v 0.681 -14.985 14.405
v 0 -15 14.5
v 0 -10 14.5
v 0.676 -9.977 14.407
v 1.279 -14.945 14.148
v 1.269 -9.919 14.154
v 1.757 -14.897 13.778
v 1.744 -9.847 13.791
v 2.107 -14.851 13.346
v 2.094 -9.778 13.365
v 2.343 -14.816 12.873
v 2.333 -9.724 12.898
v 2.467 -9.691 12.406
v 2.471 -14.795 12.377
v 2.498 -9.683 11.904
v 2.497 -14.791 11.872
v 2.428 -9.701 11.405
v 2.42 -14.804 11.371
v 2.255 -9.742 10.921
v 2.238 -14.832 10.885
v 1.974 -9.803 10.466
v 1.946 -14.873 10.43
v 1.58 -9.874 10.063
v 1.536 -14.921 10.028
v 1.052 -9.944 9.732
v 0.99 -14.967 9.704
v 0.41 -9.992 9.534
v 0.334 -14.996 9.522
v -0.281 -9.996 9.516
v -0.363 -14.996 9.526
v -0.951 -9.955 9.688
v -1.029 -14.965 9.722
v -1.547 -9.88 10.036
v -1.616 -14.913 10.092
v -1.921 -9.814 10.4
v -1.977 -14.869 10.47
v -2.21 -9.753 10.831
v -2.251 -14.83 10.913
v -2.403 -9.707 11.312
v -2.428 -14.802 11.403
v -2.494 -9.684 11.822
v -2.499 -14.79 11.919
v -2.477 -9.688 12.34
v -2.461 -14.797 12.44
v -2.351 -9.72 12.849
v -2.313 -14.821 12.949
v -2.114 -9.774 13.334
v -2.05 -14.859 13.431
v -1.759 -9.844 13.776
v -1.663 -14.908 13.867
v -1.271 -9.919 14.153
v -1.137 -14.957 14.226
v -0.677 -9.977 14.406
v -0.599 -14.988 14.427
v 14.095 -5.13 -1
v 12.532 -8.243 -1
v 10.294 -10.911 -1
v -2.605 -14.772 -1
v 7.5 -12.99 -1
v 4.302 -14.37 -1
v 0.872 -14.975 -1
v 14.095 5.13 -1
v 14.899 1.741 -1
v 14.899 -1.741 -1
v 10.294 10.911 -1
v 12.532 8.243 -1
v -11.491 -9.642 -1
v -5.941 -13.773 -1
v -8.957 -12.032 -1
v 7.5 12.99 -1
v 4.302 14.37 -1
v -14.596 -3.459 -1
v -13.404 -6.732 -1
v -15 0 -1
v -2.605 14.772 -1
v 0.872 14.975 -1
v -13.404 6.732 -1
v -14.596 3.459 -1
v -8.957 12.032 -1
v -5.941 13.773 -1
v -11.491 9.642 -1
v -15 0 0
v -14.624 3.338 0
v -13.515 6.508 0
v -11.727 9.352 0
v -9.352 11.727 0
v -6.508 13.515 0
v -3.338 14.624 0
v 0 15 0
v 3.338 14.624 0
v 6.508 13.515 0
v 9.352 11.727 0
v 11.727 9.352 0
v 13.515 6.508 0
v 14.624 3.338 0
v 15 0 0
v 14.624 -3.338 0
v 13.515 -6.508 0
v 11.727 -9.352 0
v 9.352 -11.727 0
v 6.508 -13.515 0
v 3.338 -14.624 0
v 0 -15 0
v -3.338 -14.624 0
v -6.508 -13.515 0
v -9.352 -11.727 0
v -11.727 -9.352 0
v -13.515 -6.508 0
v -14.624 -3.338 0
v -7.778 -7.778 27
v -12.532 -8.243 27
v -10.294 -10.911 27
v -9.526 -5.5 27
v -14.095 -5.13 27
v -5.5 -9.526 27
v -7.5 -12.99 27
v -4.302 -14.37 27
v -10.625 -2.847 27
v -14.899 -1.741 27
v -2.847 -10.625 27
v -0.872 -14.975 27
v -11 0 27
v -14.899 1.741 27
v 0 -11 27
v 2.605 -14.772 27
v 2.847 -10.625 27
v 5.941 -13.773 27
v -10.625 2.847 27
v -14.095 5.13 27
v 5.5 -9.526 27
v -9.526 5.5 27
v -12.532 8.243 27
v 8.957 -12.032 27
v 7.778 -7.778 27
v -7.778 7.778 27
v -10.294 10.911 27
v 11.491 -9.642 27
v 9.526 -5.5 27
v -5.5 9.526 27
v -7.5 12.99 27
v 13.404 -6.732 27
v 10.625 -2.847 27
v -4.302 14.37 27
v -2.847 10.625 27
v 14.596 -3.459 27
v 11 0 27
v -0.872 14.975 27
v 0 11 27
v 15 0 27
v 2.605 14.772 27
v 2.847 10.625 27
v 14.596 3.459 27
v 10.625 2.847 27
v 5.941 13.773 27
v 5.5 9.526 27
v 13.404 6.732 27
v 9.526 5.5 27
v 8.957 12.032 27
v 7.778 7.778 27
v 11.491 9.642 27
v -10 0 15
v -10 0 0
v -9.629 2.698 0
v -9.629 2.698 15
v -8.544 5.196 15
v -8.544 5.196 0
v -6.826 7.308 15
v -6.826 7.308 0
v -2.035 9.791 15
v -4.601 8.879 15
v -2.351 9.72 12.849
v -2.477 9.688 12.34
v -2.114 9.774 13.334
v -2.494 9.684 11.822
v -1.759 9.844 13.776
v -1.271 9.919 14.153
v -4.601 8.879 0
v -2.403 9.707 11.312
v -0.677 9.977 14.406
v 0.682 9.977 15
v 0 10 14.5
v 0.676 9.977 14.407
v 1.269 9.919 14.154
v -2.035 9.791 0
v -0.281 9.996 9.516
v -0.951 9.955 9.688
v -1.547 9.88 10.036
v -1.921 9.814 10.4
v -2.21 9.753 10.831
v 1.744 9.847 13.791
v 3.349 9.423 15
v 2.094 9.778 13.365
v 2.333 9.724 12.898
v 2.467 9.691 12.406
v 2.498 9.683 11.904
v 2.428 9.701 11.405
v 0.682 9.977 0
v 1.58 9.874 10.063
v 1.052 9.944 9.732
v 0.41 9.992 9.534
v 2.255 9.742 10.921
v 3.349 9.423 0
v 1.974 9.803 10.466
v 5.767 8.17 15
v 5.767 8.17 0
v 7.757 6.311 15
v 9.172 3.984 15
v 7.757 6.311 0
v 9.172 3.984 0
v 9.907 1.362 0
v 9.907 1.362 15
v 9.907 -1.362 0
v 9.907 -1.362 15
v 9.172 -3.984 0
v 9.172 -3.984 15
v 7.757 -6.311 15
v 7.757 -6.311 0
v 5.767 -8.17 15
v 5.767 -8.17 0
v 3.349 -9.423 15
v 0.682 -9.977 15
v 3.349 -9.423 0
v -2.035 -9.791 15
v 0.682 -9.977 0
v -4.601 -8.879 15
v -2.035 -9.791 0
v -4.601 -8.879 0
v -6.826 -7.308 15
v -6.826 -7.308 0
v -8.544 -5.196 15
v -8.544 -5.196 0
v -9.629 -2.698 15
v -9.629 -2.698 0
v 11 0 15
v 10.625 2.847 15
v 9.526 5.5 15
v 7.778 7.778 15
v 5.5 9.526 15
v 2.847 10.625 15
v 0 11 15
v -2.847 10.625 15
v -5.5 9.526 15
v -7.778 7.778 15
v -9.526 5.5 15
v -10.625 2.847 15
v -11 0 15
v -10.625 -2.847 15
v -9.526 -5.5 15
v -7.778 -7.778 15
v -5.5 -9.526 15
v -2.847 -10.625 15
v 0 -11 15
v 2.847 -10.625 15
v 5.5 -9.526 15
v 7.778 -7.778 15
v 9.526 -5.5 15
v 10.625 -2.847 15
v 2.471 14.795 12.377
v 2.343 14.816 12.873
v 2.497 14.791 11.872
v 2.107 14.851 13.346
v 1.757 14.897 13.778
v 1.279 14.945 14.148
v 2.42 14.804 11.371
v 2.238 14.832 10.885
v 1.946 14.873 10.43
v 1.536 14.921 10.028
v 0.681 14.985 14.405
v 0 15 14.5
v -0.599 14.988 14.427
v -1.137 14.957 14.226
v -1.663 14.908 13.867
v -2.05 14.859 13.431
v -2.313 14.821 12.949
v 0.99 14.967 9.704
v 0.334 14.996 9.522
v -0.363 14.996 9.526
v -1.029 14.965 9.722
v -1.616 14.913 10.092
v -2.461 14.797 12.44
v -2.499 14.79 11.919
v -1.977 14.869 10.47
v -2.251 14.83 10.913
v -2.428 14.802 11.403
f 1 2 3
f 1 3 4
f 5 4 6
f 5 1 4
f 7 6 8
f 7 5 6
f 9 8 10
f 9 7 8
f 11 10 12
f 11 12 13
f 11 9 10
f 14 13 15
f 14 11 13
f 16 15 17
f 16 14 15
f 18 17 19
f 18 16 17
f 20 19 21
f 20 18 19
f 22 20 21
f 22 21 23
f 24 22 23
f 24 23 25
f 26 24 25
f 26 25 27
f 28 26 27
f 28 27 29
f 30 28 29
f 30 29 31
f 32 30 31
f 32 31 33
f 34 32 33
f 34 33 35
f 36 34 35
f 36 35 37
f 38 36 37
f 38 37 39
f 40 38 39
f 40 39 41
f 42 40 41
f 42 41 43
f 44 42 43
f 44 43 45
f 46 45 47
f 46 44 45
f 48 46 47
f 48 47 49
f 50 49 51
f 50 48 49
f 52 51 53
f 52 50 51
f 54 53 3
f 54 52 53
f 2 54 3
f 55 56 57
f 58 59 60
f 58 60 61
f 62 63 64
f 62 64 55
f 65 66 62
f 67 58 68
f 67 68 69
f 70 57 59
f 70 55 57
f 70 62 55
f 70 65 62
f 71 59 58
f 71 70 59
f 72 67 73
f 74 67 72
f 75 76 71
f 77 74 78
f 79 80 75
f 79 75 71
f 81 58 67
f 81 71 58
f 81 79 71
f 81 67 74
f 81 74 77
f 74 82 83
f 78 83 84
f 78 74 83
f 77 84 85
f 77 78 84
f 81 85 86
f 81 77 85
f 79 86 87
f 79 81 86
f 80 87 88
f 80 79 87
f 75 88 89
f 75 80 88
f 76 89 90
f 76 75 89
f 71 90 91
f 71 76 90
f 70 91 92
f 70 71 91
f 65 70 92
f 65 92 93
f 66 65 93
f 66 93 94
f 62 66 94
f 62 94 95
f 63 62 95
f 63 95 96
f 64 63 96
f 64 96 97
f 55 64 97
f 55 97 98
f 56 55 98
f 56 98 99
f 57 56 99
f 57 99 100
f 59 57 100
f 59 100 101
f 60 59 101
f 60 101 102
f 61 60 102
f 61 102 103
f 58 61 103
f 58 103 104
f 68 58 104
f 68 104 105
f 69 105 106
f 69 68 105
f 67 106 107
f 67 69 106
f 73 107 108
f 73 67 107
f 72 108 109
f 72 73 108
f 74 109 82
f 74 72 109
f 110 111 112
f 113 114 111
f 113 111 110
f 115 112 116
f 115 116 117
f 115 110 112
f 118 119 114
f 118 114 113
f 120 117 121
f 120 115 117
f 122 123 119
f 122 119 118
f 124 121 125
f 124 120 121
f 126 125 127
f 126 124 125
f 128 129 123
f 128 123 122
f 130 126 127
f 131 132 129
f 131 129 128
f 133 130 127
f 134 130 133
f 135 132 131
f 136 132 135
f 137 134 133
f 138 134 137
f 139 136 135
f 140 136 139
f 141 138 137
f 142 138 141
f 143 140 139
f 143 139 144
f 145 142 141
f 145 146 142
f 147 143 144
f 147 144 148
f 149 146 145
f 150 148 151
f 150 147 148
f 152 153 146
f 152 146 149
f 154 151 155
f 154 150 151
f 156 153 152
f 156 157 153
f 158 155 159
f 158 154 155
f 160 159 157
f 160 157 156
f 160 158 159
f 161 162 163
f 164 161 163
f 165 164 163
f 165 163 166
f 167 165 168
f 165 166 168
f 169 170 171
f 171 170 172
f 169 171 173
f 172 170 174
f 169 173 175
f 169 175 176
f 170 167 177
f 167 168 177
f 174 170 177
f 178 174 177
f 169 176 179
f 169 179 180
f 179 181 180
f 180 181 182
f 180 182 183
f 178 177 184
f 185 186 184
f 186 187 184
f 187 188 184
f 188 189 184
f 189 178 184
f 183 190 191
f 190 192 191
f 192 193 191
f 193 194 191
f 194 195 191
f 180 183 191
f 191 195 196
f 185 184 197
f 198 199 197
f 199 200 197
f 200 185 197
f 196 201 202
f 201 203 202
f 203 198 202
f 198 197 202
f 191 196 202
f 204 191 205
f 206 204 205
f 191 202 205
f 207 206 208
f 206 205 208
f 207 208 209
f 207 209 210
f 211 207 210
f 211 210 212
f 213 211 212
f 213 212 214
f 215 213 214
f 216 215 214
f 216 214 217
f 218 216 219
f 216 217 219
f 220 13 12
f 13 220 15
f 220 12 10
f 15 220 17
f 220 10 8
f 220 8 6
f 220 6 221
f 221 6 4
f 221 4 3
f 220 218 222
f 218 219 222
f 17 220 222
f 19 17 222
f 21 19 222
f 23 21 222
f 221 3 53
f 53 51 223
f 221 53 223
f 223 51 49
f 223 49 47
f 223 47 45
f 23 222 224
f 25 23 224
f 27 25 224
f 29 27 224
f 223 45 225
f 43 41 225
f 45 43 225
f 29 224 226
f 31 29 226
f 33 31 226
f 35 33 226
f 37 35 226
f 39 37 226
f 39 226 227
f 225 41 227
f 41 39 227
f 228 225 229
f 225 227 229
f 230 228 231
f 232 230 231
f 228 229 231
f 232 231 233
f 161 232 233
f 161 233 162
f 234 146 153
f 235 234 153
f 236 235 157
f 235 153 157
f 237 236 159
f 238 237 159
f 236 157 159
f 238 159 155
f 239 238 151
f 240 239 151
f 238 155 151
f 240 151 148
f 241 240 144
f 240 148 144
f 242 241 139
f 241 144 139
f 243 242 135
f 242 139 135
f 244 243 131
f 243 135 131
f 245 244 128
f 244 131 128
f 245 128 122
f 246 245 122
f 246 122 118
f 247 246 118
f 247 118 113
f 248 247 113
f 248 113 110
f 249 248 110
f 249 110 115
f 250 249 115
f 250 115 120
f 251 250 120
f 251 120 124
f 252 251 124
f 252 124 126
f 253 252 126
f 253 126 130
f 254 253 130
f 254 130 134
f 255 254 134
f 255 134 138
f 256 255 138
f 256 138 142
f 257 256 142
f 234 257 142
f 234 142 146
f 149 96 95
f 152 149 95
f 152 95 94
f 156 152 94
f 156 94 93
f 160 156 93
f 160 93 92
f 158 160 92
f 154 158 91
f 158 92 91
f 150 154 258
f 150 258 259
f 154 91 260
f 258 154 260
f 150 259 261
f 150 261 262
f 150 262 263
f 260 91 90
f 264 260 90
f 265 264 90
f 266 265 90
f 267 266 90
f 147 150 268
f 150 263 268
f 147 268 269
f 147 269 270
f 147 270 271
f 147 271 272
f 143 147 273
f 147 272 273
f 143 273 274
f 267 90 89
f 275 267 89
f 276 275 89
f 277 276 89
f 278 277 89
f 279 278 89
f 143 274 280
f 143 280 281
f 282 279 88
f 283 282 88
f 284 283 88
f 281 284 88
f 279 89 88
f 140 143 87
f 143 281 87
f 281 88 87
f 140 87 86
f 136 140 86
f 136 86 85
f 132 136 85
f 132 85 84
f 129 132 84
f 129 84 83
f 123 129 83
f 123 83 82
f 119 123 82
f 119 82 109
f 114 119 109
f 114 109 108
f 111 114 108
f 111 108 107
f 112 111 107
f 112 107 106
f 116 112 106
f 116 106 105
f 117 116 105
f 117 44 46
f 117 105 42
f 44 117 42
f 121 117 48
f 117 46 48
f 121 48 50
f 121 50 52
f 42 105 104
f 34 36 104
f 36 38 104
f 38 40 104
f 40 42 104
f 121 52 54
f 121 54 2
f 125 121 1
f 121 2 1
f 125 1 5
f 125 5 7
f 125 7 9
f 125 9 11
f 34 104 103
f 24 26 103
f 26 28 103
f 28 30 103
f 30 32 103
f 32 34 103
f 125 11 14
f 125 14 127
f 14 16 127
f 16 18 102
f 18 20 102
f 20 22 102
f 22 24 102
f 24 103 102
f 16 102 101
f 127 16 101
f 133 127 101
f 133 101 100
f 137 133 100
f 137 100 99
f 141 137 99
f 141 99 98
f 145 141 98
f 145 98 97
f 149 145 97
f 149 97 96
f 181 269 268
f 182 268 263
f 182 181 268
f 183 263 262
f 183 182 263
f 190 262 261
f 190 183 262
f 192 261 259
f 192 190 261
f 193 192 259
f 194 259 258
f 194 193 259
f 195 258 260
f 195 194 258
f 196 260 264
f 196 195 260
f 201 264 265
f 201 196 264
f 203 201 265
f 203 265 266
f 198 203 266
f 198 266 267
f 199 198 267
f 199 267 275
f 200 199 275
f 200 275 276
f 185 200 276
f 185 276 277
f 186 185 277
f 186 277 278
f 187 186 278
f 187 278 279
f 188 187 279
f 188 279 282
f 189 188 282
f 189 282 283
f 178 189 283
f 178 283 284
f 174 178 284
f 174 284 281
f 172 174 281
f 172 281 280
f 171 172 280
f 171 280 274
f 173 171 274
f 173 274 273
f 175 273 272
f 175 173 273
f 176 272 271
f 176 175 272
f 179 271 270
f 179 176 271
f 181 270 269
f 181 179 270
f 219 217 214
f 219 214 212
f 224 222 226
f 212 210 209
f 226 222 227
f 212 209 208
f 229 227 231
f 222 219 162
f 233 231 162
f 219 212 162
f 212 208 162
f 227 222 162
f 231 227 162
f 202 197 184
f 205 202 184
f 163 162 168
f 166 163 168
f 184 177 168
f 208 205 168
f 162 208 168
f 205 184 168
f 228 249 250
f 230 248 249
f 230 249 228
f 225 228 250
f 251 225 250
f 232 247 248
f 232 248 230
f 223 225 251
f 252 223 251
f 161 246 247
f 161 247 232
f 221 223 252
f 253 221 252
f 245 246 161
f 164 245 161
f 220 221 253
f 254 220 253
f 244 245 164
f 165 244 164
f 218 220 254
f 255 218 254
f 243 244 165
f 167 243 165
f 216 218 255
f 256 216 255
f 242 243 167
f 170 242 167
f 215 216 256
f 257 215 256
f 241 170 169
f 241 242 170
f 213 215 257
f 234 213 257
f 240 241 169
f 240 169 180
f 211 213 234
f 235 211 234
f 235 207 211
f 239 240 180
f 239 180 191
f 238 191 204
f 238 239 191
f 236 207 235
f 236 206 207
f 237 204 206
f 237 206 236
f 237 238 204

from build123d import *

# Parameters (mm, degrees)
SKETCH1_R                               = 15
BOSS_EXTRUDE1_DEPTH                     = 27
CBORE_FOR_M6_HEX_HEAD_BOLT1_D           = 20
CBORE_FOR_M6_HEX_HEAD_BOLT1_CBORE_D     = 22
CBORE_FOR_M6_HEX_HEAD_BOLT1_CBORE_DEPTH = 12
BOSS_EXTRUDE2_START                     = 1
SKETCH5_R                               = 15
BOSS_EXTRUDE2_DEPTH                     = 1
CUT_EXTRUDE1_DEPTH                      = 35.336569427
CUT_EXTRUDE1_DEPTH_BACK                 = 35.336569427
SKETCH4_R                               = 2.5


with BuildPart() as part:
    # Sketch1 → Boss-Extrude1 (new body)
    with BuildSketch(Plane.XY):
        Circle(SKETCH1_R)
    extrude(amount=BOSS_EXTRUDE1_DEPTH)

    # CBORE for M6 Hex Head Bolt1 (through all)
    with Locations(Plane.XY.offset(27)):
        with Locations((0, 0)):
            CounterBoreHole(CBORE_FOR_M6_HEX_HEAD_BOLT1_D / 2, CBORE_FOR_M6_HEX_HEAD_BOLT1_CBORE_D / 2, CBORE_FOR_M6_HEX_HEAD_BOLT1_CBORE_DEPTH)

    # Sketch5 → Boss-Extrude2 (add)
    with BuildSketch(Plane(origin=(0, 0, 0), x_dir=(-1, 0, 0), z_dir=(0, 0, -1)).offset(BOSS_EXTRUDE2_START)):
        Circle(SKETCH5_R)
    extrude(amount=-BOSS_EXTRUDE2_DEPTH)

    # Sketch4 → Cut-Extrude1 (cut, two sides: drawn at the far end of the back side and taken through both)
    with BuildSketch(Plane(origin=(0, 0, 0), x_dir=(1, 0, 0), z_dir=(0, 1, 0)).offset(-CUT_EXTRUDE1_DEPTH_BACK)):
        with Locations(Location((0, -12, 0), (0, 0, 270))):
            Circle(SKETCH4_R)
    extrude(amount=CUT_EXTRUDE1_DEPTH + CUT_EXTRUDE1_DEPTH_BACK, mode=Mode.SUBTRACT)


solid = part.part
